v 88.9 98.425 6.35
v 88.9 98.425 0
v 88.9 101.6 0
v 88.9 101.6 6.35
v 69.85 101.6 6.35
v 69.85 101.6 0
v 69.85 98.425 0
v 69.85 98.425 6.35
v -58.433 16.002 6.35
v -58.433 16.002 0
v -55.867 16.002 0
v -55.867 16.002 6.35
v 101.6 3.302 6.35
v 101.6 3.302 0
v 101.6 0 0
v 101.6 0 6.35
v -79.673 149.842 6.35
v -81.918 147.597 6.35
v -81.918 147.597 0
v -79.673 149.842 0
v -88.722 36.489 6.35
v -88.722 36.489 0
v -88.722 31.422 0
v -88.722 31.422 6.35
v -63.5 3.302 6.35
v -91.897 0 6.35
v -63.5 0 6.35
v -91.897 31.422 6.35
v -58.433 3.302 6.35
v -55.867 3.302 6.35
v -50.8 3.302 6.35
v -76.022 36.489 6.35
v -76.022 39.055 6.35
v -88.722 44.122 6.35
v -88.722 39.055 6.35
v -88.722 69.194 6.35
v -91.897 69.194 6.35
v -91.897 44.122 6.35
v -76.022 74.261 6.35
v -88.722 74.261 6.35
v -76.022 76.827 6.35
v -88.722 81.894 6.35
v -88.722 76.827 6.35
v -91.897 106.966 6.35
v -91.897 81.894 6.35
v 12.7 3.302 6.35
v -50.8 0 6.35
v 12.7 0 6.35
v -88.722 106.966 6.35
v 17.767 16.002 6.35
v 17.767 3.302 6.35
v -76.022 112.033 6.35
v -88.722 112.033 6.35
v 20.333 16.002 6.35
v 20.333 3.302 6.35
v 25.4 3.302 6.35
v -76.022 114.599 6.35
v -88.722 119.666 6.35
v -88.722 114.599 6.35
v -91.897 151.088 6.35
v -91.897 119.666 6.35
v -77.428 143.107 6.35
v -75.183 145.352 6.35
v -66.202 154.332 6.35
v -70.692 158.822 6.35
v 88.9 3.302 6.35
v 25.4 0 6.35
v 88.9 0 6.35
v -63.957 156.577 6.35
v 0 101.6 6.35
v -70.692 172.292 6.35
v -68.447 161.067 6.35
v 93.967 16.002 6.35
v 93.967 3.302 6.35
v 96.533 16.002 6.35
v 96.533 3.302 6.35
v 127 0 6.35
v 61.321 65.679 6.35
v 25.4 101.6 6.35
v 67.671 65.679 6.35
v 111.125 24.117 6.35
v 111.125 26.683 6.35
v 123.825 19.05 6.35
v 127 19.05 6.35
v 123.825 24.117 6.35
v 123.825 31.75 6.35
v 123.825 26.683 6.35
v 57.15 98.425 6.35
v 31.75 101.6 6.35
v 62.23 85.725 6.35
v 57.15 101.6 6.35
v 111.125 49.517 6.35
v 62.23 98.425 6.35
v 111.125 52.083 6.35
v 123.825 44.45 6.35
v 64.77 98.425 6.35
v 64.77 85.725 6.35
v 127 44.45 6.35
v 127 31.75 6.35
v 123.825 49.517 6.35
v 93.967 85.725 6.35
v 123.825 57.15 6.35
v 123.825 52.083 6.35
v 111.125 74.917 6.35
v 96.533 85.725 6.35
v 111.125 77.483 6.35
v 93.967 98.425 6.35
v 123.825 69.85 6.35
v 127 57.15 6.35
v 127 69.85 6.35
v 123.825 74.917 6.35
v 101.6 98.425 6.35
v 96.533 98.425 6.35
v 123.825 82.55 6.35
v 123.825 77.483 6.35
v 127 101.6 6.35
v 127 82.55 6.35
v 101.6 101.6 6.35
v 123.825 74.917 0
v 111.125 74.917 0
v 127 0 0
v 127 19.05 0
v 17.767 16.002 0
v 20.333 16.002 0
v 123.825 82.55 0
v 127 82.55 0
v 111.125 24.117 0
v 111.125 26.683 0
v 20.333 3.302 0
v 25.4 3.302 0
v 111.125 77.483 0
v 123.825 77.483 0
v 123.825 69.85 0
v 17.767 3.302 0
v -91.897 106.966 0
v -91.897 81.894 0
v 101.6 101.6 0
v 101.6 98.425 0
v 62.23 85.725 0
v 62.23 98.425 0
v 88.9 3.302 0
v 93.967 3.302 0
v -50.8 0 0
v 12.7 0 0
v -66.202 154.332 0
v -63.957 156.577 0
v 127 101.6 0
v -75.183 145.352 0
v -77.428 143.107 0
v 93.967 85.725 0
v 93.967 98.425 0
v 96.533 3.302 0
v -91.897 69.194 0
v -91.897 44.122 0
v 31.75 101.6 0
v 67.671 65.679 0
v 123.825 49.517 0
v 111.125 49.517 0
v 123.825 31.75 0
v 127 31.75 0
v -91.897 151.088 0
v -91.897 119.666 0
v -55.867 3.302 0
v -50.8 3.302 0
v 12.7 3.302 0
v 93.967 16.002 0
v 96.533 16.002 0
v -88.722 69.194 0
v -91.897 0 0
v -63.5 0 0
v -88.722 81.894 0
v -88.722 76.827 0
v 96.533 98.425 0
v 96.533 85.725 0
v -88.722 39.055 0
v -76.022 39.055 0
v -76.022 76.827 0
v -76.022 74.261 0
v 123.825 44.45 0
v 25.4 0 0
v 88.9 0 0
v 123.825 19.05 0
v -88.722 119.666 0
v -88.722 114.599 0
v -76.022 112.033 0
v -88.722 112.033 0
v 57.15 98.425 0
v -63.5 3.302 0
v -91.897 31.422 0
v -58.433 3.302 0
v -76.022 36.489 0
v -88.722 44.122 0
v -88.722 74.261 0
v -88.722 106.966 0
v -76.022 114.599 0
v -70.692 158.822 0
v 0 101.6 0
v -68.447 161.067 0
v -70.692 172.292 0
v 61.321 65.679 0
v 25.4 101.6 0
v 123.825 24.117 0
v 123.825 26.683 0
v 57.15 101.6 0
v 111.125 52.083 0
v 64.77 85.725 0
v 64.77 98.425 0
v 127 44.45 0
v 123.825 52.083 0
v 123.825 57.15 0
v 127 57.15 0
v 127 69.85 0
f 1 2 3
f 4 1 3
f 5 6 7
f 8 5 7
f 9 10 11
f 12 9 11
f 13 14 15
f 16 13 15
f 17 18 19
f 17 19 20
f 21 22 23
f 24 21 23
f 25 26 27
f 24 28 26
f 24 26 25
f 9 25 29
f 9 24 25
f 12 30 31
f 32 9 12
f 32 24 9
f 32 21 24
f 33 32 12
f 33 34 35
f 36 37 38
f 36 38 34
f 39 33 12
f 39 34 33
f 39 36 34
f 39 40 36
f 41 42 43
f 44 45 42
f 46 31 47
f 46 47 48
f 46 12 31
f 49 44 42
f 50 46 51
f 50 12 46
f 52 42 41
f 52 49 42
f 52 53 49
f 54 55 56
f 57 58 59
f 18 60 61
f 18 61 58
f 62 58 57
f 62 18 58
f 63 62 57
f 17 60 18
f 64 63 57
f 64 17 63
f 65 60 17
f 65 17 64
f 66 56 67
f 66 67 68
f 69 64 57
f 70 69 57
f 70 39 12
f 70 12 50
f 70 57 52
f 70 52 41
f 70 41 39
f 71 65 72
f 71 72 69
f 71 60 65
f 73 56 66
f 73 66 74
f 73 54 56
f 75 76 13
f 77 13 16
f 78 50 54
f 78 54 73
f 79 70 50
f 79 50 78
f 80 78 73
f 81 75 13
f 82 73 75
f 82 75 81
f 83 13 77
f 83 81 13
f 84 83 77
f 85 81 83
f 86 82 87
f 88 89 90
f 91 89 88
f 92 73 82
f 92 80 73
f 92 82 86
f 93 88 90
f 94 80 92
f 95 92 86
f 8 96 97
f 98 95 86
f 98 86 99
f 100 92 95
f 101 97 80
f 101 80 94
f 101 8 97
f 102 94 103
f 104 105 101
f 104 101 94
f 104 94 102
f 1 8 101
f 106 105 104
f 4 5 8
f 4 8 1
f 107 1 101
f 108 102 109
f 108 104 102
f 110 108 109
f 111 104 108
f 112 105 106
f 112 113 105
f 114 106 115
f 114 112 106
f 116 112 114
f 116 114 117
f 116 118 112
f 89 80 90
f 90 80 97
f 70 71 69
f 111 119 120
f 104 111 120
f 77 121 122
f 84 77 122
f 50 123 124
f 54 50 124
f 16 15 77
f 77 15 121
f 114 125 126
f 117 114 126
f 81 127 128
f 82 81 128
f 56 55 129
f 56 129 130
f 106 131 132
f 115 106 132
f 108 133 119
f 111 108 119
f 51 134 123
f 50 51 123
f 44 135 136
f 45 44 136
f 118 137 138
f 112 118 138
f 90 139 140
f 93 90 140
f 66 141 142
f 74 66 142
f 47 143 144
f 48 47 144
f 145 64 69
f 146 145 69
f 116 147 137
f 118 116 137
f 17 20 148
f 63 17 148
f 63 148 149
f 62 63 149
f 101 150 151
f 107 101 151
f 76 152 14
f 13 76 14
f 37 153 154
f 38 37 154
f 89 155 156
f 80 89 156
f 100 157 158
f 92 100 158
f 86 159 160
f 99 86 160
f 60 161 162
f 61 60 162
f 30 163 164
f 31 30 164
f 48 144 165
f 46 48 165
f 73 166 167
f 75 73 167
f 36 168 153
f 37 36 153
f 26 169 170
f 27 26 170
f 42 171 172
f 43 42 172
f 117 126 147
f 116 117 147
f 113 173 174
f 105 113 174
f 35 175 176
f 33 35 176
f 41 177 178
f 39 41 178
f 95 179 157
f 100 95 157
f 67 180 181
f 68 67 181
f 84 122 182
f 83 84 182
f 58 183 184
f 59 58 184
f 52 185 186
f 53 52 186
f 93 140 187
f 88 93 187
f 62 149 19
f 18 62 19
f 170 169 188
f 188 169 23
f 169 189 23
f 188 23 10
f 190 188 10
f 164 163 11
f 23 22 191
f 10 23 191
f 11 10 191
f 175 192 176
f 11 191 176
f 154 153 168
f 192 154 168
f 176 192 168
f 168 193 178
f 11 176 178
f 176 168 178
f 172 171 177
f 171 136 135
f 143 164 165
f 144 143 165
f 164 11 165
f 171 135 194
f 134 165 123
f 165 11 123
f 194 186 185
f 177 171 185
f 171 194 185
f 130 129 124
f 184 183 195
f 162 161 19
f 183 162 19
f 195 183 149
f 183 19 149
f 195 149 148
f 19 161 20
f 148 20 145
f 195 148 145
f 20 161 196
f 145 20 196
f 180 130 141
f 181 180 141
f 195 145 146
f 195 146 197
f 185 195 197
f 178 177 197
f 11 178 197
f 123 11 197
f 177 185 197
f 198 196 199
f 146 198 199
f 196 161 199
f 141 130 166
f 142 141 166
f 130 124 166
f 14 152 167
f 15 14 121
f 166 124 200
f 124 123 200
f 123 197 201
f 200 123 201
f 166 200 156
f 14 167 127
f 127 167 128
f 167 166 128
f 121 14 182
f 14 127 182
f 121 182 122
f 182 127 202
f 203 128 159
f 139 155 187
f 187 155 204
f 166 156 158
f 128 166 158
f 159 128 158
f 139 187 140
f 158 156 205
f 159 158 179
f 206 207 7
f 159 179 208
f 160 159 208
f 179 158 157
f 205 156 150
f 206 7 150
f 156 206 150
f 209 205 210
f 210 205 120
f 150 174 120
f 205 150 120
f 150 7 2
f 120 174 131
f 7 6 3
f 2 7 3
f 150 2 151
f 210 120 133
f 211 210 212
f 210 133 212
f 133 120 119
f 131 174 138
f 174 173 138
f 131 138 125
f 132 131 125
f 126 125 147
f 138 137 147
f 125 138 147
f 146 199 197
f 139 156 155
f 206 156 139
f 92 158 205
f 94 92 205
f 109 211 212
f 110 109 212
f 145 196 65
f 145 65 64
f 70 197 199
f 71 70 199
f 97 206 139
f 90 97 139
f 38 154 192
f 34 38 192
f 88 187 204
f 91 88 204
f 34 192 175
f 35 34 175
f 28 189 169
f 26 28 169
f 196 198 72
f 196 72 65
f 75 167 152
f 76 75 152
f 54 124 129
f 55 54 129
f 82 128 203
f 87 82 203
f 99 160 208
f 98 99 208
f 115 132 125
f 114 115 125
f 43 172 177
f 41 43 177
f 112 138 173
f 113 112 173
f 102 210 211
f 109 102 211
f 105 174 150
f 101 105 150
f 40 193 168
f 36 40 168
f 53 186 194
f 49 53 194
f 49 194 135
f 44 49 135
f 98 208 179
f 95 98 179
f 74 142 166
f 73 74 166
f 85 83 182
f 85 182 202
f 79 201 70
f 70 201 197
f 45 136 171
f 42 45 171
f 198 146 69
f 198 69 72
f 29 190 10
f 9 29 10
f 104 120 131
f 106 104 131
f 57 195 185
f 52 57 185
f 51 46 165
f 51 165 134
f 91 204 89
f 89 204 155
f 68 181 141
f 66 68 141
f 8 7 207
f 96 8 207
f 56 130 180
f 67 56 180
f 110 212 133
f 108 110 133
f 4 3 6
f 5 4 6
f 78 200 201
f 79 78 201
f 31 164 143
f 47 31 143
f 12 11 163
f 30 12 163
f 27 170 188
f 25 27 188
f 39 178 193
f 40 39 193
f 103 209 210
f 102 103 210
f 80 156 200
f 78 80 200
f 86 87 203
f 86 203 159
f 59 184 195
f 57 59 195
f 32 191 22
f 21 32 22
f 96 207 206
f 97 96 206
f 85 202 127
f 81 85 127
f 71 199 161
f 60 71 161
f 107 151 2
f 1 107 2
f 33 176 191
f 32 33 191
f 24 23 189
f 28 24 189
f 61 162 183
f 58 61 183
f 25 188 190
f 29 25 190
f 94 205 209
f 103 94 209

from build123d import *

# Parameters (mm, degrees)
BOSS_EXTRUDE1_DEPTH     = 6.35
CUT_EXTRUDE2_DEPTH      = 2.54
CUT_EXTRUDE2_DEPTH_BACK = 127
CUT_EXTRUDE4_DEPTH      = 127
CUT_EXTRUDE4_DEPTH_BACK = 127
CUT_EXTRUDE5_DEPTH      = 127
CUT_EXTRUDE5_DEPTH_BACK = 127


with BuildPart() as part:
    # Sketch1 → Boss-Extrude1 (new body)
    with BuildSketch(Plane.XY):
        Polygon((0, 0), (127, 0), (127, 101.6), (0, 101.6), (-70.692427737, 172.292427737), (-91.896861793, 151.087993682), (-91.896861793, 0), align=None)
    extrude(amount=BOSS_EXTRUDE1_DEPTH)

    # Sketch2 → Cut-Extrude2 (cut, two sides: drawn at the far end of the back side and taken through both)
    with BuildSketch(Plane(origin=(0, 0, 0), x_dir=(-1, 0, 0), z_dir=(0, 0, -1)).offset(-CUT_EXTRUDE2_DEPTH_BACK)):
        Polygon((-61.321024484, 65.678975516), (-25.4, 101.6), (-31.75, 101.6), (-49.710512242, 83.639487758), (-67.671024484, 65.678975516), align=None)
    extrude(amount=CUT_EXTRUDE2_DEPTH + CUT_EXTRUDE2_DEPTH_BACK, mode=Mode.SUBTRACT)

    # Sketch3 → Cut-Extrude4 (cut, two sides: drawn at the far end of the back side and taken through both)
    with BuildSketch(Plane(origin=(0, 0, 0), x_dir=(-1, 0, 0), z_dir=(0, 0, -1)).offset(-CUT_EXTRUDE4_DEPTH_BACK)):
        Polygon((68.447363707, 161.067107586), (63.957235647, 156.576979525), (66.202299677, 154.331915495), (70.692427737, 158.822043556), align=None)
        Polygon((-127, 31.75), (-127, 19.05), (-123.825, 19.05), (-123.825, 24.1173), (-111.125, 24.1173), (-111.125, 26.6827), (-123.825, 26.6827), (-123.825, 31.75), align=None)
        Polygon((-57.15, 101.6), (-69.85, 101.6), (-69.85, 98.425), (-64.77, 98.425), (-64.77, 85.725), (-62.23, 85.725), (-62.23, 98.425), (-57.15, 98.425), align=None)
        Polygon((-88.9, 101.6), (-101.6, 101.6), (-101.6, 98.425), (-96.5327, 98.425), (-96.5327, 85.725), (-93.9673, 85.725), (-93.9673, 98.425), (-88.9, 98.425), align=None)
        Polygon((-127, 82.55), (-127, 69.85), (-123.825, 69.85), (-123.825, 74.9173), (-111.125, 74.9173), (-111.125, 77.4827), (-123.825, 77.4827), (-123.825, 82.55), align=None)
        Polygon((-127, 57.15), (-127, 44.45), (-123.825, 44.45), (-123.825, 49.5173), (-111.125, 49.5173), (-111.125, 52.0827), (-123.825, 52.0827), (-123.825, 57.15), align=None)
        Polygon((88.721861793, 106.965995261), (91.896861793, 106.965995261), (91.896861793, 119.665995261), (88.721861793, 119.665995261), (88.721861793, 114.598695261), (76.021861793, 114.598695261), (76.021861793, 112.033295261), (88.721861793, 112.033295261), align=None)
        Polygon((88.721861793, 69.193996841), (91.896861793, 69.193996841), (91.896861793, 81.893996841), (88.721861793, 81.893996841), (88.721861793, 76.826696841), (76.021861793, 76.826696841), (76.021861793, 74.261296841), (88.721861793, 74.261296841), align=None)
        Polygon((88.721861793, 31.42199842), (91.896861793, 31.42199842), (91.896861793, 44.12199842), (88.721861793, 44.12199842), (88.721861793, 39.05469842), (76.021861793, 39.05469842), (76.021861793, 36.48929842), (88.721861793, 36.48929842), align=None)
        Polygon((50.8, 3.302), (50.8, 0), (63.5, 0), (63.5, 3.302), (58.4327, 3.302), (58.4327, 16.002), (55.8673, 16.002), (55.8673, 3.302), align=None)
        Polygon((-25.4, 3.302), (-25.4, 0), (-12.7, 0), (-12.7, 3.302), (-17.7673, 3.302), (-17.7673, 16.002), (-20.3327, 16.002), (-20.3327, 3.302), align=None)
        Polygon((-101.6, 3.302), (-101.6, 0), (-88.9, 0), (-88.9, 3.302), (-93.9673, 3.302), (-93.9673, 16.002), (-96.5327, 16.002), (-96.5327, 3.302), align=None)
    extrude(amount=CUT_EXTRUDE4_DEPTH + CUT_EXTRUDE4_DEPTH_BACK, mode=Mode.SUBTRACT)

    # Sketch4 → Cut-Extrude5 (cut, two sides: drawn at the far end of the back side and taken through both)
    with BuildSketch(Plane.XY.offset(-CUT_EXTRUDE5_DEPTH_BACK)):
        Polygon((-81.917747889, 147.596723404), (-79.672683858, 149.841787435), (-75.182555798, 145.351659374), (-77.427619828, 143.106595344), align=None)
    extrude(amount=CUT_EXTRUDE5_DEPTH + CUT_EXTRUDE5_DEPTH_BACK, mode=Mode.SUBTRACT)


solid = part.part
